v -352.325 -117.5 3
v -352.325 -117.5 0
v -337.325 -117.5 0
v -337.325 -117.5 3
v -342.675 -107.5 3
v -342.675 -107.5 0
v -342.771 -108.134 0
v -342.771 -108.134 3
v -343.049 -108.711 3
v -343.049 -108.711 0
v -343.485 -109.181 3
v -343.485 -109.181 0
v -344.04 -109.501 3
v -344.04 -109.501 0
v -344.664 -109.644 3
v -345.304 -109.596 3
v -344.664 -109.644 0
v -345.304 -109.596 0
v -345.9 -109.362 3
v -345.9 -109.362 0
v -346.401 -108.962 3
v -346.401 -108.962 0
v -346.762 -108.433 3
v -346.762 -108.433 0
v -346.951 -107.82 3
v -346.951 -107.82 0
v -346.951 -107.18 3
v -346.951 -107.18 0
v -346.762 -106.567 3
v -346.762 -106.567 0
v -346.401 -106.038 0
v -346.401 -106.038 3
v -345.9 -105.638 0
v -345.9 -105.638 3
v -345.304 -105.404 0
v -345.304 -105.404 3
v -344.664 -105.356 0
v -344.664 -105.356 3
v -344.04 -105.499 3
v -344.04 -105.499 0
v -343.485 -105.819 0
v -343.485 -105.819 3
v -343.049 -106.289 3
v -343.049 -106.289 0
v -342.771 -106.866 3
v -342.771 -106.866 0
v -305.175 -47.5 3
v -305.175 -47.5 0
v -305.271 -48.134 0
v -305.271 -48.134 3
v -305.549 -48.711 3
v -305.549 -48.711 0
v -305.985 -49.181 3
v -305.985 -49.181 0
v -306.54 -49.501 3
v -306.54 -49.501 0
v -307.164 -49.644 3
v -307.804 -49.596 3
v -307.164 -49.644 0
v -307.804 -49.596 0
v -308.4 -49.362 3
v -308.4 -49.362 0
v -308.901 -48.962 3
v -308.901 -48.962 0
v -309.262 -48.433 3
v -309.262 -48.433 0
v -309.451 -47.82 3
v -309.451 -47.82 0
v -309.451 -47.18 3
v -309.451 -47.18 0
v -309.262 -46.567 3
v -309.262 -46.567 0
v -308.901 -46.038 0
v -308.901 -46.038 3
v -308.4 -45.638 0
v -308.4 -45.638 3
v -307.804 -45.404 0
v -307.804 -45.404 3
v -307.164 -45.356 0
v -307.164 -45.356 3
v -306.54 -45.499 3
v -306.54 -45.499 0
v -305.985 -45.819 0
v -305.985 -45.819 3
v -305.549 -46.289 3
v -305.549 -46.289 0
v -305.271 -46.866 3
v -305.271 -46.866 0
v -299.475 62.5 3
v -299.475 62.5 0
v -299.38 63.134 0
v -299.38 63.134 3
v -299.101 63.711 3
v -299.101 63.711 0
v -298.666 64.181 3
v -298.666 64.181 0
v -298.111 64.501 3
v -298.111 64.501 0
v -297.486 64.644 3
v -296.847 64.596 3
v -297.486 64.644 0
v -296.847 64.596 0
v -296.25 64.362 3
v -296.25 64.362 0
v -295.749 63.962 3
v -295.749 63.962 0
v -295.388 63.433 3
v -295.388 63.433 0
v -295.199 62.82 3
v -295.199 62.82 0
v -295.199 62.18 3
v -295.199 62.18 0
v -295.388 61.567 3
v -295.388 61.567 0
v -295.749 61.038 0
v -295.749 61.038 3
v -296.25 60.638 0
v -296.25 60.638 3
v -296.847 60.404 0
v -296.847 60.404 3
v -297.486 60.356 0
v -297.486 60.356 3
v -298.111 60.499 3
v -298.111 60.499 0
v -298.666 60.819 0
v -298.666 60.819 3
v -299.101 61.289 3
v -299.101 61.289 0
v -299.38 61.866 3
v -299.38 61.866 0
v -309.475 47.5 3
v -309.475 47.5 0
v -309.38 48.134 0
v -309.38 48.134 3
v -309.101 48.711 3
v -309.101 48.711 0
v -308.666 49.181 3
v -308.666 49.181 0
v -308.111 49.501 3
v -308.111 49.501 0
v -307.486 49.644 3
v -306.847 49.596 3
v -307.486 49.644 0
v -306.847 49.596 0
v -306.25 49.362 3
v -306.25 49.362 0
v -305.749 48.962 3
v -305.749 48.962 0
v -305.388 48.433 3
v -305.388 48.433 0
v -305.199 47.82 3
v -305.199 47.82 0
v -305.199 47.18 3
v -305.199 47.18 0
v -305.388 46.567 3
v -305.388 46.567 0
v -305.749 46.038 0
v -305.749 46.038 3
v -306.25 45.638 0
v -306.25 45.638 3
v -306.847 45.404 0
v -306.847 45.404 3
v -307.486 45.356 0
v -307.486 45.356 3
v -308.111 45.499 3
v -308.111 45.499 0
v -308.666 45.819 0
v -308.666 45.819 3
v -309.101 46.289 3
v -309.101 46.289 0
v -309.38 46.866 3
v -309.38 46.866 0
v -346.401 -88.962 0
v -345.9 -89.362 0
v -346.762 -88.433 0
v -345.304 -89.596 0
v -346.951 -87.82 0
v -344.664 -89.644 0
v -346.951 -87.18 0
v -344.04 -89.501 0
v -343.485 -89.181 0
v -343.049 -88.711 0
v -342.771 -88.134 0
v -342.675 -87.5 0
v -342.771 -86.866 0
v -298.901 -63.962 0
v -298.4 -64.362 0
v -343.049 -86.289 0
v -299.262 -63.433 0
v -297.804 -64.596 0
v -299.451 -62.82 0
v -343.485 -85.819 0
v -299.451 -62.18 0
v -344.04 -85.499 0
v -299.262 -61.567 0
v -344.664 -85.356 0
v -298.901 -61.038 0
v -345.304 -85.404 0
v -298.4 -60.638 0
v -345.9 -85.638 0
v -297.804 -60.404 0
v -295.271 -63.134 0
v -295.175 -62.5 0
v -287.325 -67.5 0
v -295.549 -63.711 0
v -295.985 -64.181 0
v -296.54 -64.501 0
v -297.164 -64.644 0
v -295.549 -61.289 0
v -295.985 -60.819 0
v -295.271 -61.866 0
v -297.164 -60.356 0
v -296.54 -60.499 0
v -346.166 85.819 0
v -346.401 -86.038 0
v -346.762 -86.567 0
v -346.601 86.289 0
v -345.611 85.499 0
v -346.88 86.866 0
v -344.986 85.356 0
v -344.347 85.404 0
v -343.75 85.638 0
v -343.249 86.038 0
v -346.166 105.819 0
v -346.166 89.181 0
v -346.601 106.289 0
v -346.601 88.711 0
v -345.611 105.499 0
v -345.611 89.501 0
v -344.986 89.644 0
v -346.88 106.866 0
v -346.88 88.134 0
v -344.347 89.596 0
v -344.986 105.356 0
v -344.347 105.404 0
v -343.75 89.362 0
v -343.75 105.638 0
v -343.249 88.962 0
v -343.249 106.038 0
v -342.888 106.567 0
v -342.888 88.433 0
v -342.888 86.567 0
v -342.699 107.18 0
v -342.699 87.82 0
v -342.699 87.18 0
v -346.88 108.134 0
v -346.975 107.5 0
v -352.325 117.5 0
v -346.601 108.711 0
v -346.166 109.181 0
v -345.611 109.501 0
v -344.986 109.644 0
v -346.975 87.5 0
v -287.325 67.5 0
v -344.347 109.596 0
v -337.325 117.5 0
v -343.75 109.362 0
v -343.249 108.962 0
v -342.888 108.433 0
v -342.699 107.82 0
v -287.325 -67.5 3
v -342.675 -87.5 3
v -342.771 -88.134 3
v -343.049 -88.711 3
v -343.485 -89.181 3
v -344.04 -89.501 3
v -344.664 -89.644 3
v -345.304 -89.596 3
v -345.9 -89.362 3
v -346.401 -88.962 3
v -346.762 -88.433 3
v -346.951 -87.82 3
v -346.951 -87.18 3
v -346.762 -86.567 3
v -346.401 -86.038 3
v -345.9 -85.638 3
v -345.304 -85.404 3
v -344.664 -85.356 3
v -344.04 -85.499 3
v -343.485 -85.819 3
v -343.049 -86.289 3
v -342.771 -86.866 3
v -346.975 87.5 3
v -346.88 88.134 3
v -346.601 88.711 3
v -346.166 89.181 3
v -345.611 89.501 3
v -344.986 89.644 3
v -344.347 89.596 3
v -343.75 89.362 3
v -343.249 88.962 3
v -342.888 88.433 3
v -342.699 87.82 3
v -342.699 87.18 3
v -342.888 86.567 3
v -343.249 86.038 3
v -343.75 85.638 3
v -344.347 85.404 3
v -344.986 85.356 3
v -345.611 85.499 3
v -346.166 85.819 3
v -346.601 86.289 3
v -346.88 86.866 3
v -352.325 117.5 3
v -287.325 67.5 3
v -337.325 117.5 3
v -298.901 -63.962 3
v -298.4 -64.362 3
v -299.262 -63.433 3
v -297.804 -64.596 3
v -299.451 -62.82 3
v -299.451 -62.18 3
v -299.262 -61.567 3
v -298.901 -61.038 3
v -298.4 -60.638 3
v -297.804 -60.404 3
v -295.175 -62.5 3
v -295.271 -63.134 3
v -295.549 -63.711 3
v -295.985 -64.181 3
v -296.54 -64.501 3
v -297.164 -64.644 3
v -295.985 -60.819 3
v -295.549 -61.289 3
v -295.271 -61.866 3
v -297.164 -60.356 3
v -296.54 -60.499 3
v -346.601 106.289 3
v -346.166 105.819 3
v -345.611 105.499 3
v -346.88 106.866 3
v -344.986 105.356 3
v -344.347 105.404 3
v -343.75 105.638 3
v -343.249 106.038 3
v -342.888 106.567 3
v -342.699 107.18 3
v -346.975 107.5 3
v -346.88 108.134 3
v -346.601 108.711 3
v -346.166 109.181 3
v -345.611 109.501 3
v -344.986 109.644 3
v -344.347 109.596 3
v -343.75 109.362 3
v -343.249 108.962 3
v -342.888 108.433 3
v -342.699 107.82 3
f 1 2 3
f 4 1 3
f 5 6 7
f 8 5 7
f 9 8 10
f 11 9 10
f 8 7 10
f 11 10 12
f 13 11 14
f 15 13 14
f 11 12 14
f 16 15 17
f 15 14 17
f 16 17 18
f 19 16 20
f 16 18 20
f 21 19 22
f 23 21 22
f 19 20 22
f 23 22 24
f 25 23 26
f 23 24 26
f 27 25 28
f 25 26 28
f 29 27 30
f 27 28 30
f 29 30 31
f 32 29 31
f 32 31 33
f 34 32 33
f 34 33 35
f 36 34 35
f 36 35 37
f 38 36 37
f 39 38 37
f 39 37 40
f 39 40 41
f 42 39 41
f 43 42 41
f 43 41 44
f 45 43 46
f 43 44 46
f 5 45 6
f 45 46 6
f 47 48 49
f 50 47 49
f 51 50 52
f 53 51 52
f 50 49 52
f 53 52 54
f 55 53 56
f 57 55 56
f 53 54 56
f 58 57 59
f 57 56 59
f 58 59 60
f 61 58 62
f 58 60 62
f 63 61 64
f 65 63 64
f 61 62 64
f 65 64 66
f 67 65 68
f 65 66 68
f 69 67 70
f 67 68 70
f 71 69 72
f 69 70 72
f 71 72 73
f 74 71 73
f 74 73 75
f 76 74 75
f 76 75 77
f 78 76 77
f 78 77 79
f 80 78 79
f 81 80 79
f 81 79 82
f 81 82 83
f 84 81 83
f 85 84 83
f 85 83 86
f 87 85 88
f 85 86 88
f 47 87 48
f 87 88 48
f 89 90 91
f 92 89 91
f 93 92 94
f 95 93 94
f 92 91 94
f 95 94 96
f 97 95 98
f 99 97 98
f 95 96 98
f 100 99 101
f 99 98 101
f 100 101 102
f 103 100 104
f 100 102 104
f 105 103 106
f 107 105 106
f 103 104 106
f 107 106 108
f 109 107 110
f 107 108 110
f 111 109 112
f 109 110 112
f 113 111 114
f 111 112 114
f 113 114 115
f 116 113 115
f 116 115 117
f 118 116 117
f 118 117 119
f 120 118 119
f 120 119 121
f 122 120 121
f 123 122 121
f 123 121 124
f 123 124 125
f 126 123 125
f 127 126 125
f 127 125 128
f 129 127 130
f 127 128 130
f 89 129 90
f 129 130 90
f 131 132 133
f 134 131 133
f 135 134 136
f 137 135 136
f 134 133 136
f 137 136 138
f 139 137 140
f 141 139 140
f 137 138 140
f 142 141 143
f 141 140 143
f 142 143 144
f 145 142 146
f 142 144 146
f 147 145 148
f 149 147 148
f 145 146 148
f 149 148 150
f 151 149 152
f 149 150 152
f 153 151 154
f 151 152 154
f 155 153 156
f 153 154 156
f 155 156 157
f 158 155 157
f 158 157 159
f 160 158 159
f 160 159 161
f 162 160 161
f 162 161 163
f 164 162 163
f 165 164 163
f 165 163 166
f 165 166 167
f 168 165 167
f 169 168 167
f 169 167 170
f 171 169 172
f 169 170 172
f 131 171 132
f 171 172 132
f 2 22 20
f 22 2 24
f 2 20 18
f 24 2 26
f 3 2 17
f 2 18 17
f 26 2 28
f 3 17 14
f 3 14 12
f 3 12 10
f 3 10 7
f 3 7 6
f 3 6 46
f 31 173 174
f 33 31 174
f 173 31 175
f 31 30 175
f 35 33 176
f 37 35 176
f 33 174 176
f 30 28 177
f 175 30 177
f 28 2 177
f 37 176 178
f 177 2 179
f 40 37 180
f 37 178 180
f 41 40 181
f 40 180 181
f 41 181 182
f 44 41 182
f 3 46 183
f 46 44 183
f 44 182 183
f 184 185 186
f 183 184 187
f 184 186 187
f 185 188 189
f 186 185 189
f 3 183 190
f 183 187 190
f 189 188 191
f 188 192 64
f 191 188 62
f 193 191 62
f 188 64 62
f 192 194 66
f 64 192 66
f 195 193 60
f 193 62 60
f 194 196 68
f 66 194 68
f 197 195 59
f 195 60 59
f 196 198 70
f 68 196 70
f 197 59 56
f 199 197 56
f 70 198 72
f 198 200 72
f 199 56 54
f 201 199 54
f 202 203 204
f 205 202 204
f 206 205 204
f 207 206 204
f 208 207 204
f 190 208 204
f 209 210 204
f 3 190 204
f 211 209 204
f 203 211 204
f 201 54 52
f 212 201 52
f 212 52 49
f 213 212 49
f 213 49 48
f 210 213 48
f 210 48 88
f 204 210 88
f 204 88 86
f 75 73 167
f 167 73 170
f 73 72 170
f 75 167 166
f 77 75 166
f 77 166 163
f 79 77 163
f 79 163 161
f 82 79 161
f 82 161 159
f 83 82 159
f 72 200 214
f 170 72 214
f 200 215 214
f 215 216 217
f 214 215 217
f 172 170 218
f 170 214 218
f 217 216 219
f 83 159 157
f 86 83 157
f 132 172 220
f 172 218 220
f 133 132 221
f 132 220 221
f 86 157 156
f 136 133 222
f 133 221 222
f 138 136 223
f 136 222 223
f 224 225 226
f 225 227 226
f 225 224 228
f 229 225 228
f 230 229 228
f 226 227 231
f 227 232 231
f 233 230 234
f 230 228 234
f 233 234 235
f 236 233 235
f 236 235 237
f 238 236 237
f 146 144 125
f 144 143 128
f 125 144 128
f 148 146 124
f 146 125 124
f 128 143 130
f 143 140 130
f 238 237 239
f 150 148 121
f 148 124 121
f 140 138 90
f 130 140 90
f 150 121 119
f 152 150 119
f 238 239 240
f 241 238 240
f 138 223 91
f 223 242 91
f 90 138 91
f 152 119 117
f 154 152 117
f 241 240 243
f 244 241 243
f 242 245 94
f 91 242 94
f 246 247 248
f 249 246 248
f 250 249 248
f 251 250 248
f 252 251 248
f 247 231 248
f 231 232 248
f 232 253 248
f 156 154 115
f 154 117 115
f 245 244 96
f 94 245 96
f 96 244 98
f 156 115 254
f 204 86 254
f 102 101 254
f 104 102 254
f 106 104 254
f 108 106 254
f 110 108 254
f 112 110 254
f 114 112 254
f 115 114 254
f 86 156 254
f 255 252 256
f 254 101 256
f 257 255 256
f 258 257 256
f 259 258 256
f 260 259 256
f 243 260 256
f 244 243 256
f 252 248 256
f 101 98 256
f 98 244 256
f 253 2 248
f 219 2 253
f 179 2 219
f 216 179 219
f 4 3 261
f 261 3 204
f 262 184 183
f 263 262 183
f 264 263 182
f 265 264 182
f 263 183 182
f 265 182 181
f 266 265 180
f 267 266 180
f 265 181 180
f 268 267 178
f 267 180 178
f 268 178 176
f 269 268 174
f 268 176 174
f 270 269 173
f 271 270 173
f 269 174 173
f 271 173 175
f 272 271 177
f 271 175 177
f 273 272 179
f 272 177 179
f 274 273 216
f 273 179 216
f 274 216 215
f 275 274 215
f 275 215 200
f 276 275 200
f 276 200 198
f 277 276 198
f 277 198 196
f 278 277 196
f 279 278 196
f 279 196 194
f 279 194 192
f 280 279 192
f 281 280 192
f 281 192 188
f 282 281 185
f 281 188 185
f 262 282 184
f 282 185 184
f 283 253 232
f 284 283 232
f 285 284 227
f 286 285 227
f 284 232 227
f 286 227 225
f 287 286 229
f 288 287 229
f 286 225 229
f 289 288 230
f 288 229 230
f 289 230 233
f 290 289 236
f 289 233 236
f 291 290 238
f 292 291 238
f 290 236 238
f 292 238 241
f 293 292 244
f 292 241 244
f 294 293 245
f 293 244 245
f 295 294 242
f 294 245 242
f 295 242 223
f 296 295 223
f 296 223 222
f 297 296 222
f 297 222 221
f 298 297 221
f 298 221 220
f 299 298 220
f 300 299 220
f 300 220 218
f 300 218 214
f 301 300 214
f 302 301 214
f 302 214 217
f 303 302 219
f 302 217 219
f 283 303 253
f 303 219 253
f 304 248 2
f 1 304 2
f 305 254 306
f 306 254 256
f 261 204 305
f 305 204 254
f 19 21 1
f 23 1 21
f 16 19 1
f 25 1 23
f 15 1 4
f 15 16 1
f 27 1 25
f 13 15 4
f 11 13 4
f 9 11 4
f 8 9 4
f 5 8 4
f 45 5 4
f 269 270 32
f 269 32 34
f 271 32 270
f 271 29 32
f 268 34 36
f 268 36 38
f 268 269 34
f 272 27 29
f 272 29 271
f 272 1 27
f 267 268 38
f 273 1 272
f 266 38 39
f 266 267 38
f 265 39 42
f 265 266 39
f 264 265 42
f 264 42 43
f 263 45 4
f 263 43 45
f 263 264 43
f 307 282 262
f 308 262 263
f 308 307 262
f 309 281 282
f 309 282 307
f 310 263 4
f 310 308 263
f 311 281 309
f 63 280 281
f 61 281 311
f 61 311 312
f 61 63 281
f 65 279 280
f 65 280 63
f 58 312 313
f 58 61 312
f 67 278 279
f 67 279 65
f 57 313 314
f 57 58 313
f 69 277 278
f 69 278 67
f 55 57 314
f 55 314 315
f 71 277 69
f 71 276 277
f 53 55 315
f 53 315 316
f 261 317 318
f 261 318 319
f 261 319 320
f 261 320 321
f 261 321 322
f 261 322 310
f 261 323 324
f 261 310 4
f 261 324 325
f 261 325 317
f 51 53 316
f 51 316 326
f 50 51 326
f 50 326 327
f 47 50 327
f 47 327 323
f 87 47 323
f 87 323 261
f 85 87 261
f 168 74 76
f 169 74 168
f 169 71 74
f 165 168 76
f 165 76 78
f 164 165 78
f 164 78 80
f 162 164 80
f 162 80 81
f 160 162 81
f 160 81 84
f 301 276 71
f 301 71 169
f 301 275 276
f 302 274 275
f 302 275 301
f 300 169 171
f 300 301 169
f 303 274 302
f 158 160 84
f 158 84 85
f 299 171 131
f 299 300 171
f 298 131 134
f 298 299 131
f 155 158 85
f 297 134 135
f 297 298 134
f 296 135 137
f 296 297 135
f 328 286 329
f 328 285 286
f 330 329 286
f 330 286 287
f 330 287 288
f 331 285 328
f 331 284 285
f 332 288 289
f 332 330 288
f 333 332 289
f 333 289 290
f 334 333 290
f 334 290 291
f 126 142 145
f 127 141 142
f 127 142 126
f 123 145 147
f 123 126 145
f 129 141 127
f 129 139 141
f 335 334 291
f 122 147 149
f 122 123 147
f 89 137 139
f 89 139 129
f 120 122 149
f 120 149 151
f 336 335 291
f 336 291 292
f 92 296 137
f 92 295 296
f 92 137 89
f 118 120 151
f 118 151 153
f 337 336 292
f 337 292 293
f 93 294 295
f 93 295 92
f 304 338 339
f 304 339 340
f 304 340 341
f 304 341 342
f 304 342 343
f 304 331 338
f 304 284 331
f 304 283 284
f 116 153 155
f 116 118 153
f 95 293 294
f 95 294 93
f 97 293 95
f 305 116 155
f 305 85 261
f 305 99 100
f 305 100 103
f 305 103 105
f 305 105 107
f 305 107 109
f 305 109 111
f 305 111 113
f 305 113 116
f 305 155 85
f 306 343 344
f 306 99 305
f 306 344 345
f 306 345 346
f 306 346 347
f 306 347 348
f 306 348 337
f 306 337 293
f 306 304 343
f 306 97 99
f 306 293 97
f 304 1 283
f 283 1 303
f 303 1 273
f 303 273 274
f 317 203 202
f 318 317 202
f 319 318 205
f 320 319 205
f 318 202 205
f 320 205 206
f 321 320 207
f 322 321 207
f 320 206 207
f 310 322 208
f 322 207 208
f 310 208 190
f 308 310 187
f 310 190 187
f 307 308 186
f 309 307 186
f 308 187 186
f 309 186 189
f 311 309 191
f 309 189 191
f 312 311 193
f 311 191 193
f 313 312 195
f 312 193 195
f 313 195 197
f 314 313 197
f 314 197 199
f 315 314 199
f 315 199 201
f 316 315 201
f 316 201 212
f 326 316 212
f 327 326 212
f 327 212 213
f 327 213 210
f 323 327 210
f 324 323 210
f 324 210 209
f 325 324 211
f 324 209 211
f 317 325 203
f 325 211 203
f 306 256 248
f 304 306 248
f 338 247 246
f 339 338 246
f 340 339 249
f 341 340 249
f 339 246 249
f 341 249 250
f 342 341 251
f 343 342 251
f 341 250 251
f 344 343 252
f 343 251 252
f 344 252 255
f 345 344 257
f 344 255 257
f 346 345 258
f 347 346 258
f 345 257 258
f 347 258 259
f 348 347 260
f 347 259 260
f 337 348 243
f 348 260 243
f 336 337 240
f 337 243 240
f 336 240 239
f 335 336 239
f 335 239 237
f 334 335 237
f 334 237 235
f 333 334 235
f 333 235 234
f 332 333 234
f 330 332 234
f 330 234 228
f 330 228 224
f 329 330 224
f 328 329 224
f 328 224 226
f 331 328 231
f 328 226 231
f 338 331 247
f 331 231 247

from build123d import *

# Parameters (mm, degrees)
BOSS_EXTRUDE1_DEPTH = 3
SKETCH2_R           = 2.15
CUT_EXTRUDE1_DEPTH  = 3


with BuildPart() as part:
    # Sketch1 → Boss-Extrude1 (new body)
    with BuildSketch(Plane.XY):
        Polygon((-352.325085215, 117.5), (-352.325085215, -117.5), (-337.325085215, -117.5), (-287.325085215, -67.5), (-287.325085215, 67.5), (-337.325085215, 117.5), align=None)
    extrude(amount=BOSS_EXTRUDE1_DEPTH)

    # Sketch2 → Cut-Extrude1 (cut)
    with BuildSketch(Plane(origin=(0, 0, 0), x_dir=(-1, 0, 0), z_dir=(0, 0, -1))):
        with Locations((344.825085215, 107.5)):
            Circle(SKETCH2_R)
        with Locations((344.825085215, 87.5)):
            Circle(SKETCH2_R)
        with Locations(Location((344.825085215, -87.5, 0), (0, 0, 180))):
            Circle(SKETCH2_R)
        with Locations(Location((344.825085215, -107.5, 0), (0, 0, 180))):
            Circle(SKETCH2_R)
        with Locations((297.325085215, 62.5)):
            Circle(SKETCH2_R)
        with Locations((307.325085215, 47.5)):
            Circle(SKETCH2_R)
        with Locations(Location((307.325085215, -47.5, 0), (0, 0, 180))):
            Circle(SKETCH2_R)
        with Locations(Location((297.325085215, -62.5, 0), (0, 0, 180))):
            Circle(SKETCH2_R)
    extrude(amount=-CUT_EXTRUDE1_DEPTH, mode=Mode.SUBTRACT)


solid = part.part
